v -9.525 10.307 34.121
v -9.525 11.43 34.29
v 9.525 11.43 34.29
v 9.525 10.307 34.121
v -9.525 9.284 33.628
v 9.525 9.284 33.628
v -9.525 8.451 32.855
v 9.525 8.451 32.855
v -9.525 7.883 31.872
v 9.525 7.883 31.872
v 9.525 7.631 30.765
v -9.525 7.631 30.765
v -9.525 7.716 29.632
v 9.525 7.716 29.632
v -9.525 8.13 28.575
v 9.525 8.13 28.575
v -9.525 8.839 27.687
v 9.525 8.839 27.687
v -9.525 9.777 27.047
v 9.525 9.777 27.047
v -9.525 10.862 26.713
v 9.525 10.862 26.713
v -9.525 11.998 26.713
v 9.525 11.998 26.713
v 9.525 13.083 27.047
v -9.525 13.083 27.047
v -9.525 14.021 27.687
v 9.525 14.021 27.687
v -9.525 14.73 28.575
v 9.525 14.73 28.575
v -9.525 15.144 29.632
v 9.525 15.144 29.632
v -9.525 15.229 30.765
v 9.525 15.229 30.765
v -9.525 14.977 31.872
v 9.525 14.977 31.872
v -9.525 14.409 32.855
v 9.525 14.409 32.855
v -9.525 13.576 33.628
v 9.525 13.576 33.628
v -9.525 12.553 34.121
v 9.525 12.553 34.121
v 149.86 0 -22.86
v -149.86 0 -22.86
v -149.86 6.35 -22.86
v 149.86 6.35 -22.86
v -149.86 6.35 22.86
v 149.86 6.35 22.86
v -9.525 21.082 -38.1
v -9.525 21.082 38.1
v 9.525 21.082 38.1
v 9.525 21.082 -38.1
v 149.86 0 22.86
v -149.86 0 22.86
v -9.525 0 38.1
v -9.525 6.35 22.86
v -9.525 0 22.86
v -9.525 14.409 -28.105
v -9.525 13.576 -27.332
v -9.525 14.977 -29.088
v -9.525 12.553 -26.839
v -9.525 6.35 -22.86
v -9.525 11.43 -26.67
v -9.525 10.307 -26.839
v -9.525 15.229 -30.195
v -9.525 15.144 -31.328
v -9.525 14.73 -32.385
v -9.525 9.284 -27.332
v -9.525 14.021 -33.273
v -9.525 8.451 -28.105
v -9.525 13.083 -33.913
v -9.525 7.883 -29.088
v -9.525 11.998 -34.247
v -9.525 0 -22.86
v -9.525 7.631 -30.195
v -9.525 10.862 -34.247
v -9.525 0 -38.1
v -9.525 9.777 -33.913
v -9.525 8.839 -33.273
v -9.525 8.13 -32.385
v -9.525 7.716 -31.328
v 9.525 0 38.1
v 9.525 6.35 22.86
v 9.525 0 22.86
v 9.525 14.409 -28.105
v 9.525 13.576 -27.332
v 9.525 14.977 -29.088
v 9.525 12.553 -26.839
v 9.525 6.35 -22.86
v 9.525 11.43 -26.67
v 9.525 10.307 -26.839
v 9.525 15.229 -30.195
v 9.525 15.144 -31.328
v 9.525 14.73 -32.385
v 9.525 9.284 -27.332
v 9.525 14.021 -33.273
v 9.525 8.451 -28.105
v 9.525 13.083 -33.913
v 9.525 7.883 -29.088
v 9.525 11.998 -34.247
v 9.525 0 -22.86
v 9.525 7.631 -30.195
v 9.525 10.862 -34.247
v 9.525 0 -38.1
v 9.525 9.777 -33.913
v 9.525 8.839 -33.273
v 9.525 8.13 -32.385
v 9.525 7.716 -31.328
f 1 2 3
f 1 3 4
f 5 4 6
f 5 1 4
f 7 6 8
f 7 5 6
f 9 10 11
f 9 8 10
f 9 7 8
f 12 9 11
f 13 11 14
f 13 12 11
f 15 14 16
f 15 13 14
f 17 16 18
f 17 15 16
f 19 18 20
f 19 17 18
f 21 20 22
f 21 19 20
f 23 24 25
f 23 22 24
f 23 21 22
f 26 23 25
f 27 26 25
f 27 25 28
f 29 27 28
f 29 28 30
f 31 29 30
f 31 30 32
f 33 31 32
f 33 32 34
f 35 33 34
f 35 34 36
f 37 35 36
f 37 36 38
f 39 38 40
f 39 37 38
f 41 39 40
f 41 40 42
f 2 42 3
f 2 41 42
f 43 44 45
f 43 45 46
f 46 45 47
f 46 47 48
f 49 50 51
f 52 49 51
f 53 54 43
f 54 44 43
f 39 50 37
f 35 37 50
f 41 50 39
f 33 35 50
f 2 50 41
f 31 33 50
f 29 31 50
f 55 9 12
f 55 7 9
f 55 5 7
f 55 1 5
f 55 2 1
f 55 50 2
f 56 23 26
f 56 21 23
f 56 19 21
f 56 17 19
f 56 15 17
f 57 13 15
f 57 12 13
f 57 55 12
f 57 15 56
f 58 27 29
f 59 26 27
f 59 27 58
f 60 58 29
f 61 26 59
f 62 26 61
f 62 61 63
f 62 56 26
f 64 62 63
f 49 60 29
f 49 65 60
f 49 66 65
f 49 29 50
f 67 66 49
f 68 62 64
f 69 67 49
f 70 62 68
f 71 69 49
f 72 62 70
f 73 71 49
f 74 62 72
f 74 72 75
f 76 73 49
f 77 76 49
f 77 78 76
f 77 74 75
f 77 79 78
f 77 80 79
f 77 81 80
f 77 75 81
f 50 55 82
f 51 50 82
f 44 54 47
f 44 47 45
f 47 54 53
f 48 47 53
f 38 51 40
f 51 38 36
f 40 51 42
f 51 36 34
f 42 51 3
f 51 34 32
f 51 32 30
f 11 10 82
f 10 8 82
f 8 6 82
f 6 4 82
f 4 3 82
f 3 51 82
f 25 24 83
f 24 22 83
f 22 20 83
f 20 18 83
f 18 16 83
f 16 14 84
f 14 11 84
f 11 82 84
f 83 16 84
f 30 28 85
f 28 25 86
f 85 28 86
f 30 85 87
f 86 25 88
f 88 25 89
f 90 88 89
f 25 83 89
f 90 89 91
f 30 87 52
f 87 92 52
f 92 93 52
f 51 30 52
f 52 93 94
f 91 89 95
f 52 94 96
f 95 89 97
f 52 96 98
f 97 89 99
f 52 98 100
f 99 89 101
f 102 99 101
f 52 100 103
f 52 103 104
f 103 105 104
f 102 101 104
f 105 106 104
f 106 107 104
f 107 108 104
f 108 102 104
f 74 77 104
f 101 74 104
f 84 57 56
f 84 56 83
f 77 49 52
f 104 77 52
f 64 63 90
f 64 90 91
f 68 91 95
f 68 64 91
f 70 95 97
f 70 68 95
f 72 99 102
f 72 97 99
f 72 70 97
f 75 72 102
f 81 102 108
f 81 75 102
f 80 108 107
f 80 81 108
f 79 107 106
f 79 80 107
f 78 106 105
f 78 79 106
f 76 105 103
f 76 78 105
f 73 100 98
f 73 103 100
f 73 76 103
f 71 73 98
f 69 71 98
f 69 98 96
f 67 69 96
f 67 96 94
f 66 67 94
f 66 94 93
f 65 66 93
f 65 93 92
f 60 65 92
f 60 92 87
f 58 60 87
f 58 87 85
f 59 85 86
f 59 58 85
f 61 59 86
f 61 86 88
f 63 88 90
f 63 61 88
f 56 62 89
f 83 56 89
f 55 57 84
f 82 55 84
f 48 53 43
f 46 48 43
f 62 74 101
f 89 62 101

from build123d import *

# Parameters (mm, degrees)
SKETCH1_W            = 299.72
SKETCH1_H            = 45.72
SPRING_PLATE_DEPTH   = 6.35
SKETCH2_W            = 19.05
SKETCH2_H            = 76.2
SLOT_TAB_DEPTH       = 21.082
SPLIT1_START         = 6.35
SPLIT1_OUTLINE_W     = 19.05
SPLIT1_OUTLINE_H     = 76.2
SPLIT1_DEPTH         = 14.732
SPLIT1_2_OUTLINE_W   = 19.05
SPLIT1_2_OUTLINE_H   = 15.24
SPLIT1_2_DEPTH       = 6.35
SPLIT1_3_OUTLINE_W   = 19.05
SPLIT1_3_OUTLINE_H   = 76.2
SPLIT1_3_DEPTH       = 14.732
SPLIT1_4_OUTLINE_W   = 19.05
SPLIT1_4_OUTLINE_H   = 15.24
SPLIT1_4_DEPTH       = 6.35
ROD_SLOTS_DEPTH      = 19.05
ROD_SLOTS_DEPTH_BACK = 14.732
SKETCH3_R            = 3.81


# Read off the part's stored shape, not the designer's step: Split1
with BuildPart() as part:
    # Sketch1 → Spring Plate (new body)
    with BuildSketch(Plane(origin=(0, 0, 0), x_dir=(1, 0, 0), z_dir=(0, 1, 0))):
        Rectangle(SKETCH1_W, SKETCH1_H)
    extrude(amount=SPRING_PLATE_DEPTH)

    # Sketch2 → Slot Tab (add)
    with BuildSketch(Plane(origin=(0, 0, 0), x_dir=(1, 0, 0), z_dir=(0, 1, 0))):
        Rectangle(SKETCH2_W, SKETCH2_H)
    extrude(amount=SLOT_TAB_DEPTH)

    # Split1 outline → Split1 (cut)
    with BuildSketch(Plane(origin=(0, 0, 0), x_dir=(1, 0, 0), z_dir=(0, 1, 0)).offset(SPLIT1_START)):
        Rectangle(SPLIT1_OUTLINE_W, SPLIT1_OUTLINE_H)
    extrude(amount=SPLIT1_DEPTH, mode=Mode.SUBTRACT)

    # Split1 2 outline → Split1 2 (cut)
    with BuildSketch(Plane(origin=(0, 0, 0), x_dir=(1, 0, 0), z_dir=(0, 1, 0))):
        with Locations((0, -30.48)):
            Rectangle(SPLIT1_2_OUTLINE_W, SPLIT1_2_OUTLINE_H)
        with Locations((0, 30.48)):
            Rectangle(SPLIT1_2_OUTLINE_W, SPLIT1_2_OUTLINE_H)
    extrude(amount=SPLIT1_2_DEPTH, mode=Mode.SUBTRACT)


with BuildPart() as body_2:
    # Split1 3 outline → Split1 3 (new body)
    with BuildSketch(Plane(origin=(0, 0, 0), x_dir=(1, 0, 0), z_dir=(0, 1, 0)).offset(SPLIT1_START)):
        Rectangle(SPLIT1_3_OUTLINE_W, SPLIT1_3_OUTLINE_H)
    extrude(amount=SPLIT1_3_DEPTH)

    # Split1 4 outline → Split1 4 (add)
    with BuildSketch(Plane(origin=(0, 0, 0), x_dir=(1, 0, 0), z_dir=(0, 1, 0))):
        with Locations((0, -30.48)):
            Rectangle(SPLIT1_4_OUTLINE_W, SPLIT1_4_OUTLINE_H)
        with Locations((0, 30.48)):
            Rectangle(SPLIT1_4_OUTLINE_W, SPLIT1_4_OUTLINE_H)
    extrude(amount=SPLIT1_4_DEPTH)

    # Sketch3 → Rod Slots (cut, two sides: drawn at the far end of the back side and taken through both)
    with BuildSketch(Plane(origin=(0, 0, 0), x_dir=(0, 0, -1), z_dir=(1, 0, 0)).offset(-ROD_SLOTS_DEPTH_BACK)):
        with Locations(Location((-30.48, 11.43, 0), (0, 0, 180))):
            Circle(SKETCH3_R)
        with Locations(Location((30.48, 11.43, 0), (0, 0, 180))):
            Circle(SKETCH3_R)
    extrude(amount=ROD_SLOTS_DEPTH + ROD_SLOTS_DEPTH_BACK, mode=Mode.SUBTRACT)


solid = Compound([part.part, body_2.part])
